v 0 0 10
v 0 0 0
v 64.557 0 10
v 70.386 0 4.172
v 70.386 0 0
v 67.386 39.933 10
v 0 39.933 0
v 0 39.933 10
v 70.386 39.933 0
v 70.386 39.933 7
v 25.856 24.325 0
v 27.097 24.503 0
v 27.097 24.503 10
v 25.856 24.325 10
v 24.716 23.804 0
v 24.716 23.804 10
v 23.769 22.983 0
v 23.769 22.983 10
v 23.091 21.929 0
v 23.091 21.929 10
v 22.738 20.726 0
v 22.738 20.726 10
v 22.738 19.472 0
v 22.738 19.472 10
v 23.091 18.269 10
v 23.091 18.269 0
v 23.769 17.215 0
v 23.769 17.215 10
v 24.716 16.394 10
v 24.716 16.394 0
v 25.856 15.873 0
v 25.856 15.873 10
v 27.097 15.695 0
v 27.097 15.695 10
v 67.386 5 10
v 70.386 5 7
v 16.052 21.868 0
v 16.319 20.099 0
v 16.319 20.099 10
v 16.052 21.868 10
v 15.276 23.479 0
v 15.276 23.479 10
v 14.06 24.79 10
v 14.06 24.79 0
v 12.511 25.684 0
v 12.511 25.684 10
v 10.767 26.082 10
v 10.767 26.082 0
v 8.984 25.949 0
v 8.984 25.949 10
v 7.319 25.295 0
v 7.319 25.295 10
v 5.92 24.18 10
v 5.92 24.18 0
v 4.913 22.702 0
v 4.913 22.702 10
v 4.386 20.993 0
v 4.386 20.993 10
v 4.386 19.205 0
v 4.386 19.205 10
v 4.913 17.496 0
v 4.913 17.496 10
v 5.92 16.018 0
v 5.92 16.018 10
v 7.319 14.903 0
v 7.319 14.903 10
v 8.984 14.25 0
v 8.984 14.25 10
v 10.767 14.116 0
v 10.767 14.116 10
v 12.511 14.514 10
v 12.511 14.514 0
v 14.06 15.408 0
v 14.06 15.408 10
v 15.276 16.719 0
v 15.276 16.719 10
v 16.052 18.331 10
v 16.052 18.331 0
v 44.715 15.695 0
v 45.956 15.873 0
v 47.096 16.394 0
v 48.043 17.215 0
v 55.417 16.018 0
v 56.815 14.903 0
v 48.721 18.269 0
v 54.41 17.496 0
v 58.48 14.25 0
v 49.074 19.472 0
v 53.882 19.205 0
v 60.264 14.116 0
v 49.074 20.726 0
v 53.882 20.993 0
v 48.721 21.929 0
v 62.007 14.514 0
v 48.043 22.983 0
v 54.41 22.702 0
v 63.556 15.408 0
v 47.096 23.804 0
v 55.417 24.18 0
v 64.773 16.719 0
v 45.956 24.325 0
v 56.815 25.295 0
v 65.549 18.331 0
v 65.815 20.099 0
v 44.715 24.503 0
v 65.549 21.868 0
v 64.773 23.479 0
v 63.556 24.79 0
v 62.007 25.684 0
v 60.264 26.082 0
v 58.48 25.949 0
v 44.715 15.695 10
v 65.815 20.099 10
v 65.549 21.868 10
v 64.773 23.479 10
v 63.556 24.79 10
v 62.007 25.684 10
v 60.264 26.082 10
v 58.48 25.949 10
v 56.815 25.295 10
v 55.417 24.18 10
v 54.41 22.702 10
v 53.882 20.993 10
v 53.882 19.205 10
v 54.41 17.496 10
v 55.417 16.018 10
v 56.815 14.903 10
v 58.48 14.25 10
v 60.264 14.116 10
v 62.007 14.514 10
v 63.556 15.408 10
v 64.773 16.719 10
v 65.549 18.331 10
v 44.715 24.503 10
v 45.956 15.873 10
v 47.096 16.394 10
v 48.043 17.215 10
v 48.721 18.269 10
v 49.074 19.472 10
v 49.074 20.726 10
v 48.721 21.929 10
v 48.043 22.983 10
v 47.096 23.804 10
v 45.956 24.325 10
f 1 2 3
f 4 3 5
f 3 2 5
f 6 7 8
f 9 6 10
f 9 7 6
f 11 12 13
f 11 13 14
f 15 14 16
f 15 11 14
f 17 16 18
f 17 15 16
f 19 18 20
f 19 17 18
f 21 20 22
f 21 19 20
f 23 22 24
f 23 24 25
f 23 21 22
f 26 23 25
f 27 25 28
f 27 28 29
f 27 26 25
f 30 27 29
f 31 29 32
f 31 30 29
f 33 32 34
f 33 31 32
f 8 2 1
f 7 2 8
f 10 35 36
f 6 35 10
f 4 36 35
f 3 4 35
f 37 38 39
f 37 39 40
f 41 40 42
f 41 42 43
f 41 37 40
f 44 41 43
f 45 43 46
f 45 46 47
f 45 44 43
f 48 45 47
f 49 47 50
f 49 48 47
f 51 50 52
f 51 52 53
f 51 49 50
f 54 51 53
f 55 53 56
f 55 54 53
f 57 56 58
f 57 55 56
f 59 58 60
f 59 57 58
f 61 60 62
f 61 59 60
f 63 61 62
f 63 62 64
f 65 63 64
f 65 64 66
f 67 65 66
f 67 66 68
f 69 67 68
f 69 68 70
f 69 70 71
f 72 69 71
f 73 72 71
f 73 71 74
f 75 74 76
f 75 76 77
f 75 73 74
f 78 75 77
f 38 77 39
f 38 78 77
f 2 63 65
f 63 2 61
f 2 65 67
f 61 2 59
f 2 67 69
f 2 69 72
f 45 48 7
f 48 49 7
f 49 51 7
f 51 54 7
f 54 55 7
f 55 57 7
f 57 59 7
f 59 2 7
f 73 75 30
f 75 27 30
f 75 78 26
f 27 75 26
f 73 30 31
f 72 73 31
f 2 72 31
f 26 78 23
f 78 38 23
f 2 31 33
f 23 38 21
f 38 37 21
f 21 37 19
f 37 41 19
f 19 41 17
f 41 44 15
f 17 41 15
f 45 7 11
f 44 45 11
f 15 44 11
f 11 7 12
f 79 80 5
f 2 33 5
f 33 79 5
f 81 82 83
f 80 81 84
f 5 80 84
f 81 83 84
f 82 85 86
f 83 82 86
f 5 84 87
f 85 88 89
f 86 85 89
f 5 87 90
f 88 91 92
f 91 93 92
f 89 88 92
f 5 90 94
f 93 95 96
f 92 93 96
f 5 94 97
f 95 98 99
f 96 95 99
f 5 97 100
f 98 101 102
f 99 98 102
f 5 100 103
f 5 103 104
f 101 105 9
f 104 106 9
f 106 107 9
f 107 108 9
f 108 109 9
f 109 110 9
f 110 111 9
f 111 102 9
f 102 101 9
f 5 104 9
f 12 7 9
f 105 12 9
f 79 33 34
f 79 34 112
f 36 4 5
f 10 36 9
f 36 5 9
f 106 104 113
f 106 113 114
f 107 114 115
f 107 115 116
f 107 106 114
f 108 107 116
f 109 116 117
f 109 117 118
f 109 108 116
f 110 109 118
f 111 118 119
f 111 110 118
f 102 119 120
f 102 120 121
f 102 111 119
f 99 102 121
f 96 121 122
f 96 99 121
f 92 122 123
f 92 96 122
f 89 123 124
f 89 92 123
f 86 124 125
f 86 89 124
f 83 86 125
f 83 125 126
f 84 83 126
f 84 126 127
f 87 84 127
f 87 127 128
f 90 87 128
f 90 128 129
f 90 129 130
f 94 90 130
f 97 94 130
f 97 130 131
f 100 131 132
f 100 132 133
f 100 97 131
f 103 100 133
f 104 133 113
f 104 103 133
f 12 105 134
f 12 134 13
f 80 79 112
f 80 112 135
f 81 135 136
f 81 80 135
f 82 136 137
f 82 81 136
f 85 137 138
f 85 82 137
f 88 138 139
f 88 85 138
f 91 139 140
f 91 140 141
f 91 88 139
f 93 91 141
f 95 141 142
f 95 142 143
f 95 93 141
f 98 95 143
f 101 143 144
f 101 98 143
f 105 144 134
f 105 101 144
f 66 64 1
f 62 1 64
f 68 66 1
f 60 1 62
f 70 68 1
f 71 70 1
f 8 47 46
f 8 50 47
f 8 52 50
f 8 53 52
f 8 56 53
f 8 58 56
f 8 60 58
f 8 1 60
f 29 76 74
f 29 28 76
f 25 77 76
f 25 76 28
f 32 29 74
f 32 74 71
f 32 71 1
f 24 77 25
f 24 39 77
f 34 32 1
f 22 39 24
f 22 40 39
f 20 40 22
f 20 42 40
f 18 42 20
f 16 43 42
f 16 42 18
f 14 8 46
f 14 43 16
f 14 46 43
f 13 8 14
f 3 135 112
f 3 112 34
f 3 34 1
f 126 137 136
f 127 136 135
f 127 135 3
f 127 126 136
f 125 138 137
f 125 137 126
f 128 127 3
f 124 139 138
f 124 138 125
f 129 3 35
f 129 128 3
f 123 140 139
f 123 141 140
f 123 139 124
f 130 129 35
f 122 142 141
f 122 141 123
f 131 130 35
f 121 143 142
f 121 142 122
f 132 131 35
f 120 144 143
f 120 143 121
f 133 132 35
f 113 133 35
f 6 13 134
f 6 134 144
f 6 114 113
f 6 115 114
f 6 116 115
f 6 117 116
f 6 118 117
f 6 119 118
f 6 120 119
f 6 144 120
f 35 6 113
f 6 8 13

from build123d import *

# Parameters (mm, degrees)
SKETCH_W         = 70.38591
SKETCH_H         = 39.932888
SKETCH_R         = 6
PAD_DEPTH        = 10
CHAMFER_SIZE     = 3
CHAMFER001_SIZE2 = 5
CHAMFER001_SIZE  = 2


with BuildPart() as part:
    # Sketch → Pad (new body)
    with BuildSketch(Plane.XY):
        with Locations((35.192955, 19.966444)):
            Rectangle(SKETCH_W, SKETCH_H)
        with Locations((10.318798, 20.099125)):
            Circle(SKETCH_R, mode=Mode.SUBTRACT)
        with Locations((59.81543, 20.099125)):
            Circle(SKETCH_R, mode=Mode.SUBTRACT)
        with BuildLine():
            ThreePointArc((27.097306, 24.503486), (22.692945, 20.099125), (27.097306, 15.694764))
            Line((27.097306, 15.694764), (44.71476, 15.694764))
            ThreePointArc((44.71476, 15.694764), (49.119121, 20.099125), (44.71476, 24.503486))
            Line((44.71476, 24.503486), (27.097306, 24.503486))
        make_face(mode=Mode.SUBTRACT)
    extrude(amount=PAD_DEPTH)

    # Chamfer
    chamfer_edges = [part.edges().sort_by_distance(p)[0] for p in [
        (70.38591, 19.966444, 10),
    ]]
    chamfer(chamfer_edges, length=CHAMFER_SIZE)

    # Chamfer001
    chamfer001_edges = [part.edges().sort_by_distance(p)[0] for p in [
        (68.88591, 0, 8.5),
    ]]
    chamfer001_side = part.faces().sort_by_distance((34.972942, 0, 4.974262))[0]
    chamfer(chamfer001_edges, length=CHAMFER001_SIZE, length2=CHAMFER001_SIZE2, reference=chamfer001_side)


solid = part.part
